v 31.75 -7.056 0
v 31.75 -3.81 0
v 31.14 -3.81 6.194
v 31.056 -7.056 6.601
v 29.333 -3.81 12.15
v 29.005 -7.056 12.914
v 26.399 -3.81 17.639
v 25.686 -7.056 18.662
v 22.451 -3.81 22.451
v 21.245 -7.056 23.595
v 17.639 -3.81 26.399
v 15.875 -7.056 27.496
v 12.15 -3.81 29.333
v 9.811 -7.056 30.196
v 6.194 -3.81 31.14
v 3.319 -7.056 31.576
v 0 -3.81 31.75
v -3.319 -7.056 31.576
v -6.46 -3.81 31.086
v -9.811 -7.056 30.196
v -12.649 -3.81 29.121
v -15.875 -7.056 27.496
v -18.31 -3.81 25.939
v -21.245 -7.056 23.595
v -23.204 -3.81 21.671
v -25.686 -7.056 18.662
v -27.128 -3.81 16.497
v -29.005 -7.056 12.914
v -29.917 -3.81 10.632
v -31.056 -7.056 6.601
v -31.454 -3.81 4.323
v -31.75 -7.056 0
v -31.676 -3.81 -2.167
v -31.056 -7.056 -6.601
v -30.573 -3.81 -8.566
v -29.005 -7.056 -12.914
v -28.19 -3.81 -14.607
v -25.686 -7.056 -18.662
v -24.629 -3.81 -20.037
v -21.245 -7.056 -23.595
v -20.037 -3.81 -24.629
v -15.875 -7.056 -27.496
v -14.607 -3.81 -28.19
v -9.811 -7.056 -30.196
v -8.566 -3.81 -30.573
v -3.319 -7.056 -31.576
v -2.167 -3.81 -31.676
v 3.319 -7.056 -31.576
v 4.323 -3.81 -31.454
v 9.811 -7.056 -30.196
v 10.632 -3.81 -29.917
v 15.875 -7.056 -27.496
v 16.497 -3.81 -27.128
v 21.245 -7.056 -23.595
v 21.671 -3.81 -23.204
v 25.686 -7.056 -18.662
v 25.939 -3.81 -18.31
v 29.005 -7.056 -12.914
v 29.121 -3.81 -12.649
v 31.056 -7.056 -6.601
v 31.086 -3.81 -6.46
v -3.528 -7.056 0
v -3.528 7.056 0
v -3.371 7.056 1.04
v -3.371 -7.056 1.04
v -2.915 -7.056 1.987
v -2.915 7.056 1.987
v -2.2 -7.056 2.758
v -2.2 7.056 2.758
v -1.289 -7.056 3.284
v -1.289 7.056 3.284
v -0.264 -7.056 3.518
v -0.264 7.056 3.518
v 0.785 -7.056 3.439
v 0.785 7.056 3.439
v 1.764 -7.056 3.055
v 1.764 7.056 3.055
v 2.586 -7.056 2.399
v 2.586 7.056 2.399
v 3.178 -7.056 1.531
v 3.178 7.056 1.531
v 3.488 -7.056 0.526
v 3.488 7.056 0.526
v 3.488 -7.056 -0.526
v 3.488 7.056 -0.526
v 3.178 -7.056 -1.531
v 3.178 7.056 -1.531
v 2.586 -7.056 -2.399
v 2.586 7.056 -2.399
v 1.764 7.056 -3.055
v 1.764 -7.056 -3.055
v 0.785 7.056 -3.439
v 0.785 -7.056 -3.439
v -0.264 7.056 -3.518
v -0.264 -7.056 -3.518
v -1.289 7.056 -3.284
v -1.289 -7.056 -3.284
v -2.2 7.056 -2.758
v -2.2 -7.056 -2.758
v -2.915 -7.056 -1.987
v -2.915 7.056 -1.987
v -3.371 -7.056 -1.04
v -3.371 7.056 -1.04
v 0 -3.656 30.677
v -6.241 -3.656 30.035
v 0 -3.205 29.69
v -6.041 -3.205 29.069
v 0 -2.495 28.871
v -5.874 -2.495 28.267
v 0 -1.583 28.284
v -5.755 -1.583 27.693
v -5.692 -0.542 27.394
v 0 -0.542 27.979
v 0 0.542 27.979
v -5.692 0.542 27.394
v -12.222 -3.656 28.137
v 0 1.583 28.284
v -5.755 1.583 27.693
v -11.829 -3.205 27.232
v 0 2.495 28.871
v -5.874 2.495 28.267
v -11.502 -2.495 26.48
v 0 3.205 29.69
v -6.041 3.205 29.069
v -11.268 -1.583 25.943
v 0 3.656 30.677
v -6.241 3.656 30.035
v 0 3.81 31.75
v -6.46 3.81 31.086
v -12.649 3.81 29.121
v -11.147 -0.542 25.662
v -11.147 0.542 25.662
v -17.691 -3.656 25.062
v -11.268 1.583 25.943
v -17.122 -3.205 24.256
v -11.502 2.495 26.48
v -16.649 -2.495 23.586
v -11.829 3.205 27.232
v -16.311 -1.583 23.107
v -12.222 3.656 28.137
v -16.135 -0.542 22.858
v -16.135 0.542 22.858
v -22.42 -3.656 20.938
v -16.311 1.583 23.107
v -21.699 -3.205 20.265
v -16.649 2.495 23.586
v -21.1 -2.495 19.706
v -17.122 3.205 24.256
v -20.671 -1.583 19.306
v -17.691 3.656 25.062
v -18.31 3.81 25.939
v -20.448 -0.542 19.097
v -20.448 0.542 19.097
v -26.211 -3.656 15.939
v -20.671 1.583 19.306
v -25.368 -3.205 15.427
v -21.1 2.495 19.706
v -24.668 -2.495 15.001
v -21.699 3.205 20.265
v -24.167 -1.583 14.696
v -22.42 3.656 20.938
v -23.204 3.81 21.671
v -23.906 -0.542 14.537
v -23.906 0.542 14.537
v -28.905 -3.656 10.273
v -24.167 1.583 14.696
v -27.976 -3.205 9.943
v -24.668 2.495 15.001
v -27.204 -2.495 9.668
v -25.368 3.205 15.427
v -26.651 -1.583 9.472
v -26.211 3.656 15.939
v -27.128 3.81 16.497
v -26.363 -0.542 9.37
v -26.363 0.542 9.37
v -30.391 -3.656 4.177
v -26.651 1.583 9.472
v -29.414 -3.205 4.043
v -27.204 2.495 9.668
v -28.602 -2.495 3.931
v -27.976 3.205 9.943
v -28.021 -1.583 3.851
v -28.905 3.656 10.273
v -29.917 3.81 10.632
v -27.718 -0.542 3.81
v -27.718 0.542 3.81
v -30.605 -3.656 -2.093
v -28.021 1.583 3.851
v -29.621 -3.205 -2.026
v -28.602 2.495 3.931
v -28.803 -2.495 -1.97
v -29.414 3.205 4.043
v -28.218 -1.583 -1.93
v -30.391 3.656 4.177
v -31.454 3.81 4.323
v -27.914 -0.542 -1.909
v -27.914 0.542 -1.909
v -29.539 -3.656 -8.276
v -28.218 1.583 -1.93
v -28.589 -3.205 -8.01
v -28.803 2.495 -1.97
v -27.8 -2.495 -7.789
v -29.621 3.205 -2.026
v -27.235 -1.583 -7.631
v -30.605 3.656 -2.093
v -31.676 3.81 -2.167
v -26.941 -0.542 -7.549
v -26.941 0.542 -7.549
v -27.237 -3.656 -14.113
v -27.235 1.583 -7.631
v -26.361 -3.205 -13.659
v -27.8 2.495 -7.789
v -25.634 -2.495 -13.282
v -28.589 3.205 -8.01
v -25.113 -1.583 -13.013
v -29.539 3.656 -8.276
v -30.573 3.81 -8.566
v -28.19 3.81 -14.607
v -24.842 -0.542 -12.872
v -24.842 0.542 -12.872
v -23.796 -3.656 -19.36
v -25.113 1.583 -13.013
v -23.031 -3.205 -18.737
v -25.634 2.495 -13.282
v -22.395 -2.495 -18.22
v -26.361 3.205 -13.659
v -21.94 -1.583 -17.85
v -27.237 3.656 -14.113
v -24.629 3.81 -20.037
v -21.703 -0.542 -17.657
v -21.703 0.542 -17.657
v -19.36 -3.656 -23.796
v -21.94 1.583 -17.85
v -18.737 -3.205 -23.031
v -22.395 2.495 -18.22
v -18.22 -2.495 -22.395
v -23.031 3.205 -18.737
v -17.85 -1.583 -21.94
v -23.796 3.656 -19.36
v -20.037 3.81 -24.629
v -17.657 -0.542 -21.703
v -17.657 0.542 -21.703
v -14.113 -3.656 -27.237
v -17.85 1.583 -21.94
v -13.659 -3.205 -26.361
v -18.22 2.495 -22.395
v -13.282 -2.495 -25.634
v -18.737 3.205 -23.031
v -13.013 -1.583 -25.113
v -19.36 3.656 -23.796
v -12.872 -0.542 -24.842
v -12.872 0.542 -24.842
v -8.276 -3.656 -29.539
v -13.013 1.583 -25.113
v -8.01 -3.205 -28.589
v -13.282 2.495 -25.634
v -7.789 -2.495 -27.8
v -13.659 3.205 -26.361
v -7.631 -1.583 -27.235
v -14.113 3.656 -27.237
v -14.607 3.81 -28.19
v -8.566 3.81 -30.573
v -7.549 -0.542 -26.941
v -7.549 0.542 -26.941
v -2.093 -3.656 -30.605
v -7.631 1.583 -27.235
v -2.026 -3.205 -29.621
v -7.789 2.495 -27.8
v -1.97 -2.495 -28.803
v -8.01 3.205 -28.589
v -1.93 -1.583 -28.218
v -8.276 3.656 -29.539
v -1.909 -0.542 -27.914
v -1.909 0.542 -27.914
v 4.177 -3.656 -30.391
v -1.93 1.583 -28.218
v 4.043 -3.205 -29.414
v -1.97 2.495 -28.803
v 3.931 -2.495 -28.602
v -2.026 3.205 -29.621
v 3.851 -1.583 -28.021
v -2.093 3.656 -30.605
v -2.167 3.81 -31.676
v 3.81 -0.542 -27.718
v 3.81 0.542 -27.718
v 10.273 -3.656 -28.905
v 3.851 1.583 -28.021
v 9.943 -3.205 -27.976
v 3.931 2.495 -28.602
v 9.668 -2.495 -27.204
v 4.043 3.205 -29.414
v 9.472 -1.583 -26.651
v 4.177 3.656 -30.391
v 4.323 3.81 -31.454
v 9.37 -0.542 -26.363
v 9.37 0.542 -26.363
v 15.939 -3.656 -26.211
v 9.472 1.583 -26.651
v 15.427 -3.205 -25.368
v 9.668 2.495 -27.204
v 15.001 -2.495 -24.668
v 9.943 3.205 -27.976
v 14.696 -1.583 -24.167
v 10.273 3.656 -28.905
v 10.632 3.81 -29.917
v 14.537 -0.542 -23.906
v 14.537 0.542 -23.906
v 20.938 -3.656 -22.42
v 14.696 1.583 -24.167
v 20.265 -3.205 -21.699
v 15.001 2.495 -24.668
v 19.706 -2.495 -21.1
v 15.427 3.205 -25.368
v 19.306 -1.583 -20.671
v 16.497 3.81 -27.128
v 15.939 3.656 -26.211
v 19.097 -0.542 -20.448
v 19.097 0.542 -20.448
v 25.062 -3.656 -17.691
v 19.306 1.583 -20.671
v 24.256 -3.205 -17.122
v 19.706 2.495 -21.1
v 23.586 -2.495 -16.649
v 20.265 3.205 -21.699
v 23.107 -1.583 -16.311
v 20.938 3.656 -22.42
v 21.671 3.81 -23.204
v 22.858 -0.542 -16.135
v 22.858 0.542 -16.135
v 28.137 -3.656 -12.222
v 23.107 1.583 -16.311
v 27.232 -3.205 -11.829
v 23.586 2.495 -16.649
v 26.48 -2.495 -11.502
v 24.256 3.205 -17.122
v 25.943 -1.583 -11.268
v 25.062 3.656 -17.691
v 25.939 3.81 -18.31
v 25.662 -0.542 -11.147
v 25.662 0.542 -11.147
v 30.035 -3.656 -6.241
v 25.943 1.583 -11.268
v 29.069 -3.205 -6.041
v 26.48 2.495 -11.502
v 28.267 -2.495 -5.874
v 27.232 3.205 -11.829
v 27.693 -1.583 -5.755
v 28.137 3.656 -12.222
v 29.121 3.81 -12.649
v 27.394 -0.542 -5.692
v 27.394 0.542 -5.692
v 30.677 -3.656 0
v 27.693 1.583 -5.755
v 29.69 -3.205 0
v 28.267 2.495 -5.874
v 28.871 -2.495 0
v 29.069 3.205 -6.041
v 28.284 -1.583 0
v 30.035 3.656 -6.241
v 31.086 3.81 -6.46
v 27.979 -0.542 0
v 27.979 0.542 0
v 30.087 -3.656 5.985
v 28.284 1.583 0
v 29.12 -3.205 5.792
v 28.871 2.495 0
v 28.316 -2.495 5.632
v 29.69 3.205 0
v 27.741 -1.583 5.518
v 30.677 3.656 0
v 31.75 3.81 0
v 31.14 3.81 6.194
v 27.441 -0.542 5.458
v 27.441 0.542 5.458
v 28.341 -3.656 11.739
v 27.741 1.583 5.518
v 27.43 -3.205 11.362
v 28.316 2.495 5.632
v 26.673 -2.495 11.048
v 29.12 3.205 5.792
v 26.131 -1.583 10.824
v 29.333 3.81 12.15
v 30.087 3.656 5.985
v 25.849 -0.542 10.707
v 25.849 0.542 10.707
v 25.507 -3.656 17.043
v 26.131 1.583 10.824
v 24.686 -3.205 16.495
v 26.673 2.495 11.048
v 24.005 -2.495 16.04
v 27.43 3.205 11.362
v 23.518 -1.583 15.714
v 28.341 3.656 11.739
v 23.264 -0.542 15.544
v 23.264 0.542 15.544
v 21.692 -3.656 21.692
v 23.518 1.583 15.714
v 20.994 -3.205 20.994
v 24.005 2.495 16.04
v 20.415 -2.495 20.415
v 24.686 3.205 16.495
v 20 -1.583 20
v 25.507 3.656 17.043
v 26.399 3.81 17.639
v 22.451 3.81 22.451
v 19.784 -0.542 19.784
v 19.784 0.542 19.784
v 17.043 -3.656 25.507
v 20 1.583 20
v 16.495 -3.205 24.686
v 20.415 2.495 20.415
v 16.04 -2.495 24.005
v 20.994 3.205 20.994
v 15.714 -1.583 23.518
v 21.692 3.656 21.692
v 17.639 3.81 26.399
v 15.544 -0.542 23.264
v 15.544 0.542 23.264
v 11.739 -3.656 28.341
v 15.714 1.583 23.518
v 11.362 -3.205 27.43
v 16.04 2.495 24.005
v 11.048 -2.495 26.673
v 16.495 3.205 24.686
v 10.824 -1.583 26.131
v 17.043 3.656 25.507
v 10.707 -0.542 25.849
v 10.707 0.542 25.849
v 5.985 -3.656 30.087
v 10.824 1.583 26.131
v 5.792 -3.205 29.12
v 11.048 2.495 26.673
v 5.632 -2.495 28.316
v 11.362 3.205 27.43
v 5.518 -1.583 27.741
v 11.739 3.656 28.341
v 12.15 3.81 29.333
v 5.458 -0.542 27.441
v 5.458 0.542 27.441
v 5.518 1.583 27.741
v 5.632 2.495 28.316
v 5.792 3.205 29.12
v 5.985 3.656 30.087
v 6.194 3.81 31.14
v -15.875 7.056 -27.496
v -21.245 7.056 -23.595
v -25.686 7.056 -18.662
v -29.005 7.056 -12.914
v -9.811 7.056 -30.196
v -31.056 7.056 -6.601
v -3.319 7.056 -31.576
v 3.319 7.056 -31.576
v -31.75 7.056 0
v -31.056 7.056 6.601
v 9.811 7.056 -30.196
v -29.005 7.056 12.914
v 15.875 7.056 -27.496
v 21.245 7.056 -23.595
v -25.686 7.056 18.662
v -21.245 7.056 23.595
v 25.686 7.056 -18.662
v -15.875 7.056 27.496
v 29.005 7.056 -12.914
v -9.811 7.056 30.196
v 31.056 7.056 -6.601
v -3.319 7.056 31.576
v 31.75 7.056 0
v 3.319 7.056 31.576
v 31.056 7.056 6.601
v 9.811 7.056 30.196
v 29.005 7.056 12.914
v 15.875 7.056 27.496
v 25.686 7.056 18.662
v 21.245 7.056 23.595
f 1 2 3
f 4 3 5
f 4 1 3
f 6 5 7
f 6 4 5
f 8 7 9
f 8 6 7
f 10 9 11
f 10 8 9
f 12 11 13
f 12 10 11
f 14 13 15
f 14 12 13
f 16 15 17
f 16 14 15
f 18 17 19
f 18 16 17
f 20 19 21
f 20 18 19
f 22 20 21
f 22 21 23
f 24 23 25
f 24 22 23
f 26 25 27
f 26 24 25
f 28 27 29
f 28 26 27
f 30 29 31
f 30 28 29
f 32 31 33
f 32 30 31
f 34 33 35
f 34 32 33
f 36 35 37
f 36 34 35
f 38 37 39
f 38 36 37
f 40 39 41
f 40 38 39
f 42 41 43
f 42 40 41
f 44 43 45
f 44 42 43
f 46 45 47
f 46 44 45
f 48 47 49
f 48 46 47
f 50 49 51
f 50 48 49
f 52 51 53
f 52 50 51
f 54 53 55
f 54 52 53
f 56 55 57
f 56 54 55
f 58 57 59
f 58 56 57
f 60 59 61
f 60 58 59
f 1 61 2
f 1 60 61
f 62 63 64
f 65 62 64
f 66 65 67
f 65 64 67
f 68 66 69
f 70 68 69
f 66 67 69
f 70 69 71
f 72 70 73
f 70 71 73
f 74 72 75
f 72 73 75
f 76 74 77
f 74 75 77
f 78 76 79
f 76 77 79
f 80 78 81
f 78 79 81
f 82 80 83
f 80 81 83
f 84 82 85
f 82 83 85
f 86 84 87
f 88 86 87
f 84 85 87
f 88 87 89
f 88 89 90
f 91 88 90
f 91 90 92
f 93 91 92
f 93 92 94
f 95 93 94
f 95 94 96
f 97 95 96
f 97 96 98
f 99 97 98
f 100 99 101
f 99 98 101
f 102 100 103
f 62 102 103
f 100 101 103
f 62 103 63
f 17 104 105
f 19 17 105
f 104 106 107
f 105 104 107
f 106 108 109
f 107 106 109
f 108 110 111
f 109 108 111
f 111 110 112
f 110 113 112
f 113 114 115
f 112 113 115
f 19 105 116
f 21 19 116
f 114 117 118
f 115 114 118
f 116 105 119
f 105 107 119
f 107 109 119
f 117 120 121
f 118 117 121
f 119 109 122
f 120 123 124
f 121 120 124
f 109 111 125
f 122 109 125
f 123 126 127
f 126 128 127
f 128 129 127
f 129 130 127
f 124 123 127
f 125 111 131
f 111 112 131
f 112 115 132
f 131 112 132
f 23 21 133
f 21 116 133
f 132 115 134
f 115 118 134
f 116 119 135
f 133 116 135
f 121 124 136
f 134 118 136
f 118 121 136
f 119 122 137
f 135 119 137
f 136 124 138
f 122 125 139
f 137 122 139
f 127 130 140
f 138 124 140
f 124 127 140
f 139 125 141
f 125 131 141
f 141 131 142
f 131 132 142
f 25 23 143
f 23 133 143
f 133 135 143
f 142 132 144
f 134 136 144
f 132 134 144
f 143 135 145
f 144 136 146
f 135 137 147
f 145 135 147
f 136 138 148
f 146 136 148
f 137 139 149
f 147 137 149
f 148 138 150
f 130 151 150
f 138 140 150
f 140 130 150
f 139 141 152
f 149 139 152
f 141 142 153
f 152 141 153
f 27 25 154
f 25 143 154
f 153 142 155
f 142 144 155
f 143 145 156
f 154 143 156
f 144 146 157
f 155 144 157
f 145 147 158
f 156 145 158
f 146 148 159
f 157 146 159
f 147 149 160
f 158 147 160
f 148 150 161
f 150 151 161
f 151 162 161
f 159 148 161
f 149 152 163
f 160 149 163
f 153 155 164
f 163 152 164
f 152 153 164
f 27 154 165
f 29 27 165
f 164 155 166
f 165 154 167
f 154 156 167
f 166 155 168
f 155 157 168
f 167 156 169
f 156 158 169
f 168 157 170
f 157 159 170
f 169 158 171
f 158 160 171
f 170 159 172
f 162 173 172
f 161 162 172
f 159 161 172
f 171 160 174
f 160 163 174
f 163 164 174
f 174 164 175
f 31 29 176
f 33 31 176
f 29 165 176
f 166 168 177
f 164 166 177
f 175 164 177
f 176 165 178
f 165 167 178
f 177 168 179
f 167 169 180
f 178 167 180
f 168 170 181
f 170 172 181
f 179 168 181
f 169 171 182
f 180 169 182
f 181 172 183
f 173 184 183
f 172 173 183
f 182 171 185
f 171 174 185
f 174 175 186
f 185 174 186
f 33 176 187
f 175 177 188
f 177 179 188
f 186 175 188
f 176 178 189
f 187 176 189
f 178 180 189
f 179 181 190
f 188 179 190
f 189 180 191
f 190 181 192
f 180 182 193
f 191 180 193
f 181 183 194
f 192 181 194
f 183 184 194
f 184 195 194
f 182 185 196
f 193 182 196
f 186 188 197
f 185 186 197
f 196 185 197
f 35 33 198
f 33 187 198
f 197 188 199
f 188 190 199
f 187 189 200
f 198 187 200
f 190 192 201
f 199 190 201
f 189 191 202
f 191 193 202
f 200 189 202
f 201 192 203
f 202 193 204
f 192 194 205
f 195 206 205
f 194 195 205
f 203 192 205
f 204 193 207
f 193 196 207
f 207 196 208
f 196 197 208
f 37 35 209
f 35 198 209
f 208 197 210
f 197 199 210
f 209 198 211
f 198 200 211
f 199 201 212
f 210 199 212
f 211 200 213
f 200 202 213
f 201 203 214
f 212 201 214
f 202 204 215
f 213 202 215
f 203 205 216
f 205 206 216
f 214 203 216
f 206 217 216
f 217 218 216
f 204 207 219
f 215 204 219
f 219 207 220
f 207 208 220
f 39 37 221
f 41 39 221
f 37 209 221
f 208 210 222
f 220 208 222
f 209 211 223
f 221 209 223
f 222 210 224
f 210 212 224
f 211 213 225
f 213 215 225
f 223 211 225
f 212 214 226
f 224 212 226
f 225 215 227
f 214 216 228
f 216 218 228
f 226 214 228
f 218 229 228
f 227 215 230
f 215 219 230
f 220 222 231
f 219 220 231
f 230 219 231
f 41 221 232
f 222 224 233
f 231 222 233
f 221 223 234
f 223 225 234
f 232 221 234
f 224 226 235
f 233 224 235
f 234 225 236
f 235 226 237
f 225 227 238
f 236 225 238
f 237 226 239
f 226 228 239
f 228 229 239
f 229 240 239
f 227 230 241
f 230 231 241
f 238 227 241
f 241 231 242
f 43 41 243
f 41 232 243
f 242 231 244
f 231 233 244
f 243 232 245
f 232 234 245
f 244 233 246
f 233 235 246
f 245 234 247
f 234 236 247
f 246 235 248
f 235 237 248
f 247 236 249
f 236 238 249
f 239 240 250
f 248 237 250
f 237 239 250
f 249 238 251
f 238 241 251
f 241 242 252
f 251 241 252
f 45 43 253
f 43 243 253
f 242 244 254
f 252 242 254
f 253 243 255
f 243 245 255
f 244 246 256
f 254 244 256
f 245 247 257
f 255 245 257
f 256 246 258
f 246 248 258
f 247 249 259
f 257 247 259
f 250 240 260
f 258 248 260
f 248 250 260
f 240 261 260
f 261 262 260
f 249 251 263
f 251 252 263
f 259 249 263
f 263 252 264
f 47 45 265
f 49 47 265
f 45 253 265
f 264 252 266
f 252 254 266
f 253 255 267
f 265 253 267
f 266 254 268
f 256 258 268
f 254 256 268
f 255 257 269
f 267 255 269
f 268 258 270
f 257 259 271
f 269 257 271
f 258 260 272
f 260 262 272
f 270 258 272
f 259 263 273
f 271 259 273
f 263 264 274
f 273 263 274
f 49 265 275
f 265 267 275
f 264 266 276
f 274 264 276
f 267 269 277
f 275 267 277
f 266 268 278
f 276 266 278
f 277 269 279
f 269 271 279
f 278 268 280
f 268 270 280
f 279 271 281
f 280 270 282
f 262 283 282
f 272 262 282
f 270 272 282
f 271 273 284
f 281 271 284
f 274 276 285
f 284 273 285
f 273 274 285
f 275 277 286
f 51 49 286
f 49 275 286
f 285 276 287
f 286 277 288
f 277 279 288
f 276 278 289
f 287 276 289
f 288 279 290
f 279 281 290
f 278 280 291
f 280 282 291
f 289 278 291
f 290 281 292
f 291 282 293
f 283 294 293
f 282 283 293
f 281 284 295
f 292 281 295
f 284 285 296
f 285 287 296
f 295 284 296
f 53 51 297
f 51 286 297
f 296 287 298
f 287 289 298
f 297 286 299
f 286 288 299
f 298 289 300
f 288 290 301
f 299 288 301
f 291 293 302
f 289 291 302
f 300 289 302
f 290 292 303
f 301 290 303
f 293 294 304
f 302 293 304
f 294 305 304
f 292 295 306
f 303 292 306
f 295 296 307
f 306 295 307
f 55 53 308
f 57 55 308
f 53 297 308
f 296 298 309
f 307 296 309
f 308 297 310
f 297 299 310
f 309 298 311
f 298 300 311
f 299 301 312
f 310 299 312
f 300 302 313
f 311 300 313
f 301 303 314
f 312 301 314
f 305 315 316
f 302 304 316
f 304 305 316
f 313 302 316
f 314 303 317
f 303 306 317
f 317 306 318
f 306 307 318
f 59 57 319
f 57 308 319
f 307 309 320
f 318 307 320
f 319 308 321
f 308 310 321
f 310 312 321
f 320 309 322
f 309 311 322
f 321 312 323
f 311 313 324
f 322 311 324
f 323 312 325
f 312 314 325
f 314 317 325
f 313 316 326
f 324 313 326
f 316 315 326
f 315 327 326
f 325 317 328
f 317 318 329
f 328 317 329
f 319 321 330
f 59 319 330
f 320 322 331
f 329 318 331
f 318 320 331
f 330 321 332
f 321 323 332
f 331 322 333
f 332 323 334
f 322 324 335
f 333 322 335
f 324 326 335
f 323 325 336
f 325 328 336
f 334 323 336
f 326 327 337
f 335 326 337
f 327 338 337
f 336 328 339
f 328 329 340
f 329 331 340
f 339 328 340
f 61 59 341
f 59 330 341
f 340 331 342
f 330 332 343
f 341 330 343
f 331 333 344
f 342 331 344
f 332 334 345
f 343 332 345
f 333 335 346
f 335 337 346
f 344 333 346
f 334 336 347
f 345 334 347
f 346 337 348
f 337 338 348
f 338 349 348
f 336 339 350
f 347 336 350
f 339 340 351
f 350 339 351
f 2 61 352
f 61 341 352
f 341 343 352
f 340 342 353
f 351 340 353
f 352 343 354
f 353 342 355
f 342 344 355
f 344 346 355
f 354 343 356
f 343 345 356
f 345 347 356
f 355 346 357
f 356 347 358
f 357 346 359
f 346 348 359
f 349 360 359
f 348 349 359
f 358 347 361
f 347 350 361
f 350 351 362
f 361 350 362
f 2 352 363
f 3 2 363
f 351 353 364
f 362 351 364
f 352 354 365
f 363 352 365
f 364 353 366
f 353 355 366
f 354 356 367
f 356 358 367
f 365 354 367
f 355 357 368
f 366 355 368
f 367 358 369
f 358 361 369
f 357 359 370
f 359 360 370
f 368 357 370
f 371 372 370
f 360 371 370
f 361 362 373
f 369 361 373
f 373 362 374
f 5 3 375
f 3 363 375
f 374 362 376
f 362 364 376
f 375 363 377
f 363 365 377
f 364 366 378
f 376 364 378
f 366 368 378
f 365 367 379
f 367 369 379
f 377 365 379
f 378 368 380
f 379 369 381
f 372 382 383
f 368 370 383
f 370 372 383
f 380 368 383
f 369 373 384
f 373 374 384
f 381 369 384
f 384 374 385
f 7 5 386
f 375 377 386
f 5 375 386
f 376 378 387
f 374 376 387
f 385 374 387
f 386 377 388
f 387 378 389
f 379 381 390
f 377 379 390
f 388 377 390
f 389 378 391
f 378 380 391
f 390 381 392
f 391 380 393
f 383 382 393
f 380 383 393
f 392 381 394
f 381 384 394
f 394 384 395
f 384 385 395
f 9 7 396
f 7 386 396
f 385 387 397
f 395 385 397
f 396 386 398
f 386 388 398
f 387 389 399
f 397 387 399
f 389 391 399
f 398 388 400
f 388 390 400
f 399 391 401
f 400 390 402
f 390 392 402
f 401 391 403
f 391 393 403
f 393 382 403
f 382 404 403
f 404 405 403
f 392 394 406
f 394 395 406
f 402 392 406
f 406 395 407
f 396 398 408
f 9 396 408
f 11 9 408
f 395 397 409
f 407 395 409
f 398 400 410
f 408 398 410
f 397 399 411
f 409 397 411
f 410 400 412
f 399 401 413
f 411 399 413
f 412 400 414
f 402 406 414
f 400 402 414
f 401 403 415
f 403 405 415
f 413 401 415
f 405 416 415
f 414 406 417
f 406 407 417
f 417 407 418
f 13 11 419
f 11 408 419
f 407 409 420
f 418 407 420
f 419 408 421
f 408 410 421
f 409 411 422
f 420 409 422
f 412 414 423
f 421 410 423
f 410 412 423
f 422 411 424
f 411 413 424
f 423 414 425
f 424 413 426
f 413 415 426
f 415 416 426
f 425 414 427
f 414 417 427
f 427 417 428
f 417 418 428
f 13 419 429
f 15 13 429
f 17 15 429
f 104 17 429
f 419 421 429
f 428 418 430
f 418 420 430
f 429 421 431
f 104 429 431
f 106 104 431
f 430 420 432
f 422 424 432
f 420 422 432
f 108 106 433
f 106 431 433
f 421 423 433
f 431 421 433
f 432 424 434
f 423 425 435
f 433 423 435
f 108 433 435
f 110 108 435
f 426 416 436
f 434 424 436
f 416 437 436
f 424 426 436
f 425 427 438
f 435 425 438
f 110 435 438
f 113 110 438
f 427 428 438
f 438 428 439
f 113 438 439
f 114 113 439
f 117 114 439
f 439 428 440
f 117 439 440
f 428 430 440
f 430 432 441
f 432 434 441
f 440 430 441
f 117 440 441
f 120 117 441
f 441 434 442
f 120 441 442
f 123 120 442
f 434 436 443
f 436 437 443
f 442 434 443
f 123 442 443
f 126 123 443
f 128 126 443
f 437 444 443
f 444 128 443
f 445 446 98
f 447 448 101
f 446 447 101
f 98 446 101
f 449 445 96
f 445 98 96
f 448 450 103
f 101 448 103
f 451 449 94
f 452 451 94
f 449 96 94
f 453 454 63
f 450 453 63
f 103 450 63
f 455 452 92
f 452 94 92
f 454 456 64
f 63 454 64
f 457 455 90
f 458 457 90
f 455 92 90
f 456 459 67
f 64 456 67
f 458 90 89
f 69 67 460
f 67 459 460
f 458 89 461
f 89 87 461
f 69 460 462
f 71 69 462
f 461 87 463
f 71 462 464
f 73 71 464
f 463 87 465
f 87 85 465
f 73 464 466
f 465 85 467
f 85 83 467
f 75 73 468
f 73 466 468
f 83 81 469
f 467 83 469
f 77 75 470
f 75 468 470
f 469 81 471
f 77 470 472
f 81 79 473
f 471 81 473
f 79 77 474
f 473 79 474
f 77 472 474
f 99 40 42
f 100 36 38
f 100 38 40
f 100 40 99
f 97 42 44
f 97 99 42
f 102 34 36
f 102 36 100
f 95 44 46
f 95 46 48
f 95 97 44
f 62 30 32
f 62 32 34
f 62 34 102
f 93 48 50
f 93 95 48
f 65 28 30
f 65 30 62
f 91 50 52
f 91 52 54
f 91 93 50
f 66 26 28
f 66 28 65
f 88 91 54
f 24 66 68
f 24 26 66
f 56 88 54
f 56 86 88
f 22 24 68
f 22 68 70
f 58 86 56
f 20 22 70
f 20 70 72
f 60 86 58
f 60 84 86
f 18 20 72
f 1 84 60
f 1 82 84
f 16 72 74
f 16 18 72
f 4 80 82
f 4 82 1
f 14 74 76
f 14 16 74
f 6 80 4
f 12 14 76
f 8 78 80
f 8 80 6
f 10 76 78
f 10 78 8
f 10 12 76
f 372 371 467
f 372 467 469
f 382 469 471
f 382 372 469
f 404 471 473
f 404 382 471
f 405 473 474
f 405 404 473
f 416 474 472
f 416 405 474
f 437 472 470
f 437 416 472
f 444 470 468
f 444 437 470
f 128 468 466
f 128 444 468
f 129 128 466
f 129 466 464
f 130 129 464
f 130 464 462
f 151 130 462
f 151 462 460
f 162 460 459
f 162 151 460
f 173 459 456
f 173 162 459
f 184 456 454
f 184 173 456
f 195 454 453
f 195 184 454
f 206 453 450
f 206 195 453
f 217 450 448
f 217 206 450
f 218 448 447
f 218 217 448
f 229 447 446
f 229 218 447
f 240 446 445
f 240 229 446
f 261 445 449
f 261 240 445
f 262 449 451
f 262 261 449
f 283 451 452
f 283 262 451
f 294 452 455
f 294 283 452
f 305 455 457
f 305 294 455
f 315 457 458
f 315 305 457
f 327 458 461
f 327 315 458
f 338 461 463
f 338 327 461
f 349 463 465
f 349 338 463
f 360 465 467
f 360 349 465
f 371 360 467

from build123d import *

# Parameters (mm, degrees)
F1_R     = 31.75
F2_DEPTH = 7.0555555556
F5_R     = 3.5277777778
F6_DEPTH = 14.1111111111


# Not quite as in the source:
# - a variable given as a bare number and used for a length is read in inches; the dataset says mm whatever the document's units were


with BuildPart() as f2:
    # F1 (on Front) → F2 (new body, symmetric)
    with BuildSketch(Plane.XZ):
        Circle(F1_R)
    extrude(amount=F2_DEPTH, both=True)

    # F3 (on Right) → F4 (revolve, cut)
    with BuildSketch(Plane.YZ):
        with BuildLine():
            Line((3.81, 31.75), (-3.81, 31.75))
            ThreePointArc((-3.81, 31.75), (0, 27.94), (3.81, 31.75))
        make_face()
    revolve(axis=Axis((0, -7.0555555556, 0), (0, -1, 0)), mode=Mode.SUBTRACT)

    # F5 (on face) → F6 (cut, through all)
    with BuildSketch(Plane(origin=(0, 7.0555555556, 0), x_dir=(-1, 0, 0), z_dir=(0, 1, 0))):
        Circle(F5_R)
    extrude(amount=-F6_DEPTH, mode=Mode.SUBTRACT)


solid = f2.part
